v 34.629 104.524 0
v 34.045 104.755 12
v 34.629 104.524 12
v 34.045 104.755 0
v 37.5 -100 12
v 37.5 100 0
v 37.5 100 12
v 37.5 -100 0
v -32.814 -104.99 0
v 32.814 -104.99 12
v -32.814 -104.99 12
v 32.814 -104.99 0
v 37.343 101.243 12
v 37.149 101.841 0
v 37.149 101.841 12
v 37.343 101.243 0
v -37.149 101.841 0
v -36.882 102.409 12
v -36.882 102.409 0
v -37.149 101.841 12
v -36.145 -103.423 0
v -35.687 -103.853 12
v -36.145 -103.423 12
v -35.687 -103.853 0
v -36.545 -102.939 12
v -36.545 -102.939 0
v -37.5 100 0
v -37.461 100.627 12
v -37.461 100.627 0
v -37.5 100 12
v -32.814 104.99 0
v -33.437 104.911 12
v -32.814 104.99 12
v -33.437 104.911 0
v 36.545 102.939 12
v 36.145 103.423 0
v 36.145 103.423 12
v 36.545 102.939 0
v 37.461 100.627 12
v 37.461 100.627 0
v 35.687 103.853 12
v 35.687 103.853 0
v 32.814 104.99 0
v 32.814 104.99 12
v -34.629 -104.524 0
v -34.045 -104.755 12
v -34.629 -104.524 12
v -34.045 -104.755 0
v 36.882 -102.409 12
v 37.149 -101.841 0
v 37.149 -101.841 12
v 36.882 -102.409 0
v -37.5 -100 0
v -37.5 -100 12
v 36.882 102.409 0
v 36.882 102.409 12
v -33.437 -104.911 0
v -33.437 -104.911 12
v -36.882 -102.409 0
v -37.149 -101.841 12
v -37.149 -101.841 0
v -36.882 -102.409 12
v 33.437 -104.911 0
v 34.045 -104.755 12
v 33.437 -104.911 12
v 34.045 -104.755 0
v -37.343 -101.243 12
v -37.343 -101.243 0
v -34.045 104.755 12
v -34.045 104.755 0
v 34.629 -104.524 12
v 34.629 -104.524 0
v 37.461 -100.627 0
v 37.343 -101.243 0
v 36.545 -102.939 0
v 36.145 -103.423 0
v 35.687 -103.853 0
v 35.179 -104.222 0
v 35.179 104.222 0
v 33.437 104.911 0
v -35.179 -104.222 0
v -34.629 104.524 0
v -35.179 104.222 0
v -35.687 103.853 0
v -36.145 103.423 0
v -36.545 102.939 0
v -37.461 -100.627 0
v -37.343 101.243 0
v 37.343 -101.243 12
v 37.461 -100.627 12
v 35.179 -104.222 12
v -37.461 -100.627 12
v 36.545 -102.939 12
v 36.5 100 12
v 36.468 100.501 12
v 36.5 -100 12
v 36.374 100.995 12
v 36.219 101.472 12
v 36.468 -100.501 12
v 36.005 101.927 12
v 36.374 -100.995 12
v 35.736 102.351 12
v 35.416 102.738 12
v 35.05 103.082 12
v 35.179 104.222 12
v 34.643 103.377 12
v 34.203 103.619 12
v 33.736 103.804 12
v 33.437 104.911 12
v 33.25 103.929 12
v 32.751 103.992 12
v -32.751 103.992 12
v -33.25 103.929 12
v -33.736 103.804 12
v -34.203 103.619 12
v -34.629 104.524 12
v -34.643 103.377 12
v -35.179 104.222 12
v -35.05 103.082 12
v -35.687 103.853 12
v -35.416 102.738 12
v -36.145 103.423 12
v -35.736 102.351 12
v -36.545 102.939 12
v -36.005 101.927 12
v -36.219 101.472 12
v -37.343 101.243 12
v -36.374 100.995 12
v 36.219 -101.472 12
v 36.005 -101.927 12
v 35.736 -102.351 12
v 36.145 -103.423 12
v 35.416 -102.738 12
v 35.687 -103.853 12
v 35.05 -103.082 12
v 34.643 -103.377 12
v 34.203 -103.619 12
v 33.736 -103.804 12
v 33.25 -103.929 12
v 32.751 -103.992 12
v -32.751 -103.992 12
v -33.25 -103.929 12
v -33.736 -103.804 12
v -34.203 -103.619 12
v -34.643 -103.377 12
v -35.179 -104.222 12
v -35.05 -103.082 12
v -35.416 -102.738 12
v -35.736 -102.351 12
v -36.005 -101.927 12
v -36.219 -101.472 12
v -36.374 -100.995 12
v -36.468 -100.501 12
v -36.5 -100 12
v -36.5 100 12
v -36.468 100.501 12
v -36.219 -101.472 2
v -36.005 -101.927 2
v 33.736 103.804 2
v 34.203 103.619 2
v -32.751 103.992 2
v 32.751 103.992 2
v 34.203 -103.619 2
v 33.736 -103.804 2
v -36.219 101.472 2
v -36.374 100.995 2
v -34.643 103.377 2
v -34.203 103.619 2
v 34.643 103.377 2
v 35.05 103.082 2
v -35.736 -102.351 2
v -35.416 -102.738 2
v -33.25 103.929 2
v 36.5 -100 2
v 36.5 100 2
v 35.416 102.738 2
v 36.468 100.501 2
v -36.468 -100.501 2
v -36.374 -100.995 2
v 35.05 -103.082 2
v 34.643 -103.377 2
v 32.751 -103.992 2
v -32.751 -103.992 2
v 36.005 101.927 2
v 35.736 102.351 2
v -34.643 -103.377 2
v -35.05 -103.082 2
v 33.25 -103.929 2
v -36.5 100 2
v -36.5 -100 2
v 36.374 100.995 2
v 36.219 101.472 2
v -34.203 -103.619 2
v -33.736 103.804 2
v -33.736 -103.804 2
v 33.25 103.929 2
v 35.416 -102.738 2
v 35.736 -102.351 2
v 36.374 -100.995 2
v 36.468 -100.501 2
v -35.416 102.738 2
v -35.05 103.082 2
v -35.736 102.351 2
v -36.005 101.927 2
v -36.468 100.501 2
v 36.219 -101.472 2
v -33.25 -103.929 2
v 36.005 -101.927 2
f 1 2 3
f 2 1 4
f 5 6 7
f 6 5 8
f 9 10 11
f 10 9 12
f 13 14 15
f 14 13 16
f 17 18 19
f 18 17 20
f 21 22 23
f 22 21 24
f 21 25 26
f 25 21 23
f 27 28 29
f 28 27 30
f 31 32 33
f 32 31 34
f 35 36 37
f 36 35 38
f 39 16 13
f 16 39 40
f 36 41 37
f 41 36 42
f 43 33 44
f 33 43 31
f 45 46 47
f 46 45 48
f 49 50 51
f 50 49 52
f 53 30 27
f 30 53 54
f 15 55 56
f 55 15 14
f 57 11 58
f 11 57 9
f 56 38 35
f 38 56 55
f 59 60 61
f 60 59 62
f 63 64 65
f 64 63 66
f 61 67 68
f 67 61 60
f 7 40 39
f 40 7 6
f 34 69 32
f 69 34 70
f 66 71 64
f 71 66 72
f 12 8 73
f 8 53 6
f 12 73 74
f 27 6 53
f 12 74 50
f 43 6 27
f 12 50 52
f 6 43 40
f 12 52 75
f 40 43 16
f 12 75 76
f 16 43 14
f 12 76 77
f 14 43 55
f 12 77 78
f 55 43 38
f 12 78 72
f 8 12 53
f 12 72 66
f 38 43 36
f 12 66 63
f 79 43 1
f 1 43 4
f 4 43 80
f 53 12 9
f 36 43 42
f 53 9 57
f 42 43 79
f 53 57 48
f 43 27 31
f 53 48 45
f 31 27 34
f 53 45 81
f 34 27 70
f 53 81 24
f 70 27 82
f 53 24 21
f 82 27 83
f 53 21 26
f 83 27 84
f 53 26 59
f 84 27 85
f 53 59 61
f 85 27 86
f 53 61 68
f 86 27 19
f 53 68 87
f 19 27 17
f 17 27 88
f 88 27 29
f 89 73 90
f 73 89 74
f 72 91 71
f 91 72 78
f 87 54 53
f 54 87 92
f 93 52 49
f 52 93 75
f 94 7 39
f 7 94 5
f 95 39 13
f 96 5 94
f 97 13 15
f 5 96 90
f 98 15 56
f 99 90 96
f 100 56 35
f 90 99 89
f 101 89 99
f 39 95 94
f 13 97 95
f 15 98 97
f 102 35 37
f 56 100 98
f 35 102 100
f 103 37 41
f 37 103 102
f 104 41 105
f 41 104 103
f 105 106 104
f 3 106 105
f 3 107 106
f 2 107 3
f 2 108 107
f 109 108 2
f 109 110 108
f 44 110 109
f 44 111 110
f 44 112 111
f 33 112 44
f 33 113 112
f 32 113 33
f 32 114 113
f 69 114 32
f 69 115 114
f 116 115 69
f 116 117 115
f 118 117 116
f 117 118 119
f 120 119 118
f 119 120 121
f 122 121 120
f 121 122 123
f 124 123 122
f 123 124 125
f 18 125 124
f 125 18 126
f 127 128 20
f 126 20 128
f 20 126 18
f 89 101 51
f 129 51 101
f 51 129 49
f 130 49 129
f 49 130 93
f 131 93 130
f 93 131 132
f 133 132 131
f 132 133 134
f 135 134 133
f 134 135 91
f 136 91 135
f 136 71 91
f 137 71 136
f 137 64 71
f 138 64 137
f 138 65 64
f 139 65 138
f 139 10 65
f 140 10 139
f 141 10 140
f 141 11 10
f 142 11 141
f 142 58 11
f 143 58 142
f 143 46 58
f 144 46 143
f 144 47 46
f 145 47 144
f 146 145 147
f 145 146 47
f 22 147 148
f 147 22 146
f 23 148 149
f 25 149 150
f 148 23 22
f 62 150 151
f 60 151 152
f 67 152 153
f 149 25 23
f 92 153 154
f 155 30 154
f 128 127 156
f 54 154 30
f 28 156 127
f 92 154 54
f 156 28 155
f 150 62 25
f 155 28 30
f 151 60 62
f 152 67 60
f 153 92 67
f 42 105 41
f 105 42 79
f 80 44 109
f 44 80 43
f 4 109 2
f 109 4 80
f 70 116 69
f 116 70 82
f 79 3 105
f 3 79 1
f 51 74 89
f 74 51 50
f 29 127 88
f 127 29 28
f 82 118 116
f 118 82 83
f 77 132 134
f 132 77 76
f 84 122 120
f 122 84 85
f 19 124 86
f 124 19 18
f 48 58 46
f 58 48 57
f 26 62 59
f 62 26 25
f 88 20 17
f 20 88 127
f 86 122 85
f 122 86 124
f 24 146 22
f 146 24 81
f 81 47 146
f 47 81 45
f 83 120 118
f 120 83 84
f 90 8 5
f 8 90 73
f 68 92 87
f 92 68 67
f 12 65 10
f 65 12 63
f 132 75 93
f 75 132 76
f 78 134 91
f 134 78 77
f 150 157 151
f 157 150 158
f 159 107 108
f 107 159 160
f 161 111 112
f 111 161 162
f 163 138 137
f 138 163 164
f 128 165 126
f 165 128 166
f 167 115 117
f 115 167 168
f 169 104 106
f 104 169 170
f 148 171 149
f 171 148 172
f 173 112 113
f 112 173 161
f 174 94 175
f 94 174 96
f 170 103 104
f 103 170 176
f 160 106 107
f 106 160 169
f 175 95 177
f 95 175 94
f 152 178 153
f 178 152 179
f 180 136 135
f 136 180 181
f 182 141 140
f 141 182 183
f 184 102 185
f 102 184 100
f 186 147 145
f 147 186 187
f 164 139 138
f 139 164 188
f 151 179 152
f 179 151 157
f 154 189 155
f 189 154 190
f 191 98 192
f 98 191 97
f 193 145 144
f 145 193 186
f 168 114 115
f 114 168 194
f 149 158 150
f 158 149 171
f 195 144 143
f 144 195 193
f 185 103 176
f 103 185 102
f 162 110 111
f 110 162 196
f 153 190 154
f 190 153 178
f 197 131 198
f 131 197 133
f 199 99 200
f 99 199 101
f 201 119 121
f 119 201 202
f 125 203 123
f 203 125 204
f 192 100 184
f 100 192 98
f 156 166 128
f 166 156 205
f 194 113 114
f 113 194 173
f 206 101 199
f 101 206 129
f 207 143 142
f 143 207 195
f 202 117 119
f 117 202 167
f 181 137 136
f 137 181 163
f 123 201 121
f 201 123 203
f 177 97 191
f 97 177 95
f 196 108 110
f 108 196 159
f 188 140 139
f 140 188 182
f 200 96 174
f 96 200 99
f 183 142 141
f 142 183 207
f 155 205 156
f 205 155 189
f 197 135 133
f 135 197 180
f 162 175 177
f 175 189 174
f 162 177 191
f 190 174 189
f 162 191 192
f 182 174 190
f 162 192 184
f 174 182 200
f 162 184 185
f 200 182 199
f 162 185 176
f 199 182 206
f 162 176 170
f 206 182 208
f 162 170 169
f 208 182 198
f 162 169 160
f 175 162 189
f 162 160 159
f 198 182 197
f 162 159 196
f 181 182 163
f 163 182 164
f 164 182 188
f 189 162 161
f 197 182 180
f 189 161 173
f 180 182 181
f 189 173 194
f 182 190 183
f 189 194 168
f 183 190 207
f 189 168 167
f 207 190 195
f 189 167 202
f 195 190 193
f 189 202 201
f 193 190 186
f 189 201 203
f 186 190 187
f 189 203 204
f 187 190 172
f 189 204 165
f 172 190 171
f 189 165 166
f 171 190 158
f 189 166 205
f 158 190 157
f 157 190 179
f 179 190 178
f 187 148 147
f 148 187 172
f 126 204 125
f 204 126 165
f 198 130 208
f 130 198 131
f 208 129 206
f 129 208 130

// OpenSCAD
$fn = 50;


difference() {
	union() {
		hull() {
			translate(v = [-32.5000000000, 100.0000000000, 0]) {
				cylinder(h = 12, r = 5);
			}
			translate(v = [32.5000000000, 100.0000000000, 0]) {
				cylinder(h = 12, r = 5);
			}
			translate(v = [-32.5000000000, -100.0000000000, 0]) {
				cylinder(h = 12, r = 5);
			}
			translate(v = [32.5000000000, -100.0000000000, 0]) {
				cylinder(h = 12, r = 5);
			}
		}
	}
	union() {
		translate(v = [0, 0, 2]) {
			hull() {
				translate(v = [-32.5000000000, 100.0000000000, 0]) {
					cylinder(h = 10, r = 4);
				}
				translate(v = [32.5000000000, 100.0000000000, 0]) {
					cylinder(h = 10, r = 4);
				}
				translate(v = [-32.5000000000, -100.0000000000, 0]) {
					cylinder(h = 10, r = 4);
				}
				translate(v = [32.5000000000, -100.0000000000, 0]) {
					cylinder(h = 10, r = 4);
				}
			}
		}
	}
}
